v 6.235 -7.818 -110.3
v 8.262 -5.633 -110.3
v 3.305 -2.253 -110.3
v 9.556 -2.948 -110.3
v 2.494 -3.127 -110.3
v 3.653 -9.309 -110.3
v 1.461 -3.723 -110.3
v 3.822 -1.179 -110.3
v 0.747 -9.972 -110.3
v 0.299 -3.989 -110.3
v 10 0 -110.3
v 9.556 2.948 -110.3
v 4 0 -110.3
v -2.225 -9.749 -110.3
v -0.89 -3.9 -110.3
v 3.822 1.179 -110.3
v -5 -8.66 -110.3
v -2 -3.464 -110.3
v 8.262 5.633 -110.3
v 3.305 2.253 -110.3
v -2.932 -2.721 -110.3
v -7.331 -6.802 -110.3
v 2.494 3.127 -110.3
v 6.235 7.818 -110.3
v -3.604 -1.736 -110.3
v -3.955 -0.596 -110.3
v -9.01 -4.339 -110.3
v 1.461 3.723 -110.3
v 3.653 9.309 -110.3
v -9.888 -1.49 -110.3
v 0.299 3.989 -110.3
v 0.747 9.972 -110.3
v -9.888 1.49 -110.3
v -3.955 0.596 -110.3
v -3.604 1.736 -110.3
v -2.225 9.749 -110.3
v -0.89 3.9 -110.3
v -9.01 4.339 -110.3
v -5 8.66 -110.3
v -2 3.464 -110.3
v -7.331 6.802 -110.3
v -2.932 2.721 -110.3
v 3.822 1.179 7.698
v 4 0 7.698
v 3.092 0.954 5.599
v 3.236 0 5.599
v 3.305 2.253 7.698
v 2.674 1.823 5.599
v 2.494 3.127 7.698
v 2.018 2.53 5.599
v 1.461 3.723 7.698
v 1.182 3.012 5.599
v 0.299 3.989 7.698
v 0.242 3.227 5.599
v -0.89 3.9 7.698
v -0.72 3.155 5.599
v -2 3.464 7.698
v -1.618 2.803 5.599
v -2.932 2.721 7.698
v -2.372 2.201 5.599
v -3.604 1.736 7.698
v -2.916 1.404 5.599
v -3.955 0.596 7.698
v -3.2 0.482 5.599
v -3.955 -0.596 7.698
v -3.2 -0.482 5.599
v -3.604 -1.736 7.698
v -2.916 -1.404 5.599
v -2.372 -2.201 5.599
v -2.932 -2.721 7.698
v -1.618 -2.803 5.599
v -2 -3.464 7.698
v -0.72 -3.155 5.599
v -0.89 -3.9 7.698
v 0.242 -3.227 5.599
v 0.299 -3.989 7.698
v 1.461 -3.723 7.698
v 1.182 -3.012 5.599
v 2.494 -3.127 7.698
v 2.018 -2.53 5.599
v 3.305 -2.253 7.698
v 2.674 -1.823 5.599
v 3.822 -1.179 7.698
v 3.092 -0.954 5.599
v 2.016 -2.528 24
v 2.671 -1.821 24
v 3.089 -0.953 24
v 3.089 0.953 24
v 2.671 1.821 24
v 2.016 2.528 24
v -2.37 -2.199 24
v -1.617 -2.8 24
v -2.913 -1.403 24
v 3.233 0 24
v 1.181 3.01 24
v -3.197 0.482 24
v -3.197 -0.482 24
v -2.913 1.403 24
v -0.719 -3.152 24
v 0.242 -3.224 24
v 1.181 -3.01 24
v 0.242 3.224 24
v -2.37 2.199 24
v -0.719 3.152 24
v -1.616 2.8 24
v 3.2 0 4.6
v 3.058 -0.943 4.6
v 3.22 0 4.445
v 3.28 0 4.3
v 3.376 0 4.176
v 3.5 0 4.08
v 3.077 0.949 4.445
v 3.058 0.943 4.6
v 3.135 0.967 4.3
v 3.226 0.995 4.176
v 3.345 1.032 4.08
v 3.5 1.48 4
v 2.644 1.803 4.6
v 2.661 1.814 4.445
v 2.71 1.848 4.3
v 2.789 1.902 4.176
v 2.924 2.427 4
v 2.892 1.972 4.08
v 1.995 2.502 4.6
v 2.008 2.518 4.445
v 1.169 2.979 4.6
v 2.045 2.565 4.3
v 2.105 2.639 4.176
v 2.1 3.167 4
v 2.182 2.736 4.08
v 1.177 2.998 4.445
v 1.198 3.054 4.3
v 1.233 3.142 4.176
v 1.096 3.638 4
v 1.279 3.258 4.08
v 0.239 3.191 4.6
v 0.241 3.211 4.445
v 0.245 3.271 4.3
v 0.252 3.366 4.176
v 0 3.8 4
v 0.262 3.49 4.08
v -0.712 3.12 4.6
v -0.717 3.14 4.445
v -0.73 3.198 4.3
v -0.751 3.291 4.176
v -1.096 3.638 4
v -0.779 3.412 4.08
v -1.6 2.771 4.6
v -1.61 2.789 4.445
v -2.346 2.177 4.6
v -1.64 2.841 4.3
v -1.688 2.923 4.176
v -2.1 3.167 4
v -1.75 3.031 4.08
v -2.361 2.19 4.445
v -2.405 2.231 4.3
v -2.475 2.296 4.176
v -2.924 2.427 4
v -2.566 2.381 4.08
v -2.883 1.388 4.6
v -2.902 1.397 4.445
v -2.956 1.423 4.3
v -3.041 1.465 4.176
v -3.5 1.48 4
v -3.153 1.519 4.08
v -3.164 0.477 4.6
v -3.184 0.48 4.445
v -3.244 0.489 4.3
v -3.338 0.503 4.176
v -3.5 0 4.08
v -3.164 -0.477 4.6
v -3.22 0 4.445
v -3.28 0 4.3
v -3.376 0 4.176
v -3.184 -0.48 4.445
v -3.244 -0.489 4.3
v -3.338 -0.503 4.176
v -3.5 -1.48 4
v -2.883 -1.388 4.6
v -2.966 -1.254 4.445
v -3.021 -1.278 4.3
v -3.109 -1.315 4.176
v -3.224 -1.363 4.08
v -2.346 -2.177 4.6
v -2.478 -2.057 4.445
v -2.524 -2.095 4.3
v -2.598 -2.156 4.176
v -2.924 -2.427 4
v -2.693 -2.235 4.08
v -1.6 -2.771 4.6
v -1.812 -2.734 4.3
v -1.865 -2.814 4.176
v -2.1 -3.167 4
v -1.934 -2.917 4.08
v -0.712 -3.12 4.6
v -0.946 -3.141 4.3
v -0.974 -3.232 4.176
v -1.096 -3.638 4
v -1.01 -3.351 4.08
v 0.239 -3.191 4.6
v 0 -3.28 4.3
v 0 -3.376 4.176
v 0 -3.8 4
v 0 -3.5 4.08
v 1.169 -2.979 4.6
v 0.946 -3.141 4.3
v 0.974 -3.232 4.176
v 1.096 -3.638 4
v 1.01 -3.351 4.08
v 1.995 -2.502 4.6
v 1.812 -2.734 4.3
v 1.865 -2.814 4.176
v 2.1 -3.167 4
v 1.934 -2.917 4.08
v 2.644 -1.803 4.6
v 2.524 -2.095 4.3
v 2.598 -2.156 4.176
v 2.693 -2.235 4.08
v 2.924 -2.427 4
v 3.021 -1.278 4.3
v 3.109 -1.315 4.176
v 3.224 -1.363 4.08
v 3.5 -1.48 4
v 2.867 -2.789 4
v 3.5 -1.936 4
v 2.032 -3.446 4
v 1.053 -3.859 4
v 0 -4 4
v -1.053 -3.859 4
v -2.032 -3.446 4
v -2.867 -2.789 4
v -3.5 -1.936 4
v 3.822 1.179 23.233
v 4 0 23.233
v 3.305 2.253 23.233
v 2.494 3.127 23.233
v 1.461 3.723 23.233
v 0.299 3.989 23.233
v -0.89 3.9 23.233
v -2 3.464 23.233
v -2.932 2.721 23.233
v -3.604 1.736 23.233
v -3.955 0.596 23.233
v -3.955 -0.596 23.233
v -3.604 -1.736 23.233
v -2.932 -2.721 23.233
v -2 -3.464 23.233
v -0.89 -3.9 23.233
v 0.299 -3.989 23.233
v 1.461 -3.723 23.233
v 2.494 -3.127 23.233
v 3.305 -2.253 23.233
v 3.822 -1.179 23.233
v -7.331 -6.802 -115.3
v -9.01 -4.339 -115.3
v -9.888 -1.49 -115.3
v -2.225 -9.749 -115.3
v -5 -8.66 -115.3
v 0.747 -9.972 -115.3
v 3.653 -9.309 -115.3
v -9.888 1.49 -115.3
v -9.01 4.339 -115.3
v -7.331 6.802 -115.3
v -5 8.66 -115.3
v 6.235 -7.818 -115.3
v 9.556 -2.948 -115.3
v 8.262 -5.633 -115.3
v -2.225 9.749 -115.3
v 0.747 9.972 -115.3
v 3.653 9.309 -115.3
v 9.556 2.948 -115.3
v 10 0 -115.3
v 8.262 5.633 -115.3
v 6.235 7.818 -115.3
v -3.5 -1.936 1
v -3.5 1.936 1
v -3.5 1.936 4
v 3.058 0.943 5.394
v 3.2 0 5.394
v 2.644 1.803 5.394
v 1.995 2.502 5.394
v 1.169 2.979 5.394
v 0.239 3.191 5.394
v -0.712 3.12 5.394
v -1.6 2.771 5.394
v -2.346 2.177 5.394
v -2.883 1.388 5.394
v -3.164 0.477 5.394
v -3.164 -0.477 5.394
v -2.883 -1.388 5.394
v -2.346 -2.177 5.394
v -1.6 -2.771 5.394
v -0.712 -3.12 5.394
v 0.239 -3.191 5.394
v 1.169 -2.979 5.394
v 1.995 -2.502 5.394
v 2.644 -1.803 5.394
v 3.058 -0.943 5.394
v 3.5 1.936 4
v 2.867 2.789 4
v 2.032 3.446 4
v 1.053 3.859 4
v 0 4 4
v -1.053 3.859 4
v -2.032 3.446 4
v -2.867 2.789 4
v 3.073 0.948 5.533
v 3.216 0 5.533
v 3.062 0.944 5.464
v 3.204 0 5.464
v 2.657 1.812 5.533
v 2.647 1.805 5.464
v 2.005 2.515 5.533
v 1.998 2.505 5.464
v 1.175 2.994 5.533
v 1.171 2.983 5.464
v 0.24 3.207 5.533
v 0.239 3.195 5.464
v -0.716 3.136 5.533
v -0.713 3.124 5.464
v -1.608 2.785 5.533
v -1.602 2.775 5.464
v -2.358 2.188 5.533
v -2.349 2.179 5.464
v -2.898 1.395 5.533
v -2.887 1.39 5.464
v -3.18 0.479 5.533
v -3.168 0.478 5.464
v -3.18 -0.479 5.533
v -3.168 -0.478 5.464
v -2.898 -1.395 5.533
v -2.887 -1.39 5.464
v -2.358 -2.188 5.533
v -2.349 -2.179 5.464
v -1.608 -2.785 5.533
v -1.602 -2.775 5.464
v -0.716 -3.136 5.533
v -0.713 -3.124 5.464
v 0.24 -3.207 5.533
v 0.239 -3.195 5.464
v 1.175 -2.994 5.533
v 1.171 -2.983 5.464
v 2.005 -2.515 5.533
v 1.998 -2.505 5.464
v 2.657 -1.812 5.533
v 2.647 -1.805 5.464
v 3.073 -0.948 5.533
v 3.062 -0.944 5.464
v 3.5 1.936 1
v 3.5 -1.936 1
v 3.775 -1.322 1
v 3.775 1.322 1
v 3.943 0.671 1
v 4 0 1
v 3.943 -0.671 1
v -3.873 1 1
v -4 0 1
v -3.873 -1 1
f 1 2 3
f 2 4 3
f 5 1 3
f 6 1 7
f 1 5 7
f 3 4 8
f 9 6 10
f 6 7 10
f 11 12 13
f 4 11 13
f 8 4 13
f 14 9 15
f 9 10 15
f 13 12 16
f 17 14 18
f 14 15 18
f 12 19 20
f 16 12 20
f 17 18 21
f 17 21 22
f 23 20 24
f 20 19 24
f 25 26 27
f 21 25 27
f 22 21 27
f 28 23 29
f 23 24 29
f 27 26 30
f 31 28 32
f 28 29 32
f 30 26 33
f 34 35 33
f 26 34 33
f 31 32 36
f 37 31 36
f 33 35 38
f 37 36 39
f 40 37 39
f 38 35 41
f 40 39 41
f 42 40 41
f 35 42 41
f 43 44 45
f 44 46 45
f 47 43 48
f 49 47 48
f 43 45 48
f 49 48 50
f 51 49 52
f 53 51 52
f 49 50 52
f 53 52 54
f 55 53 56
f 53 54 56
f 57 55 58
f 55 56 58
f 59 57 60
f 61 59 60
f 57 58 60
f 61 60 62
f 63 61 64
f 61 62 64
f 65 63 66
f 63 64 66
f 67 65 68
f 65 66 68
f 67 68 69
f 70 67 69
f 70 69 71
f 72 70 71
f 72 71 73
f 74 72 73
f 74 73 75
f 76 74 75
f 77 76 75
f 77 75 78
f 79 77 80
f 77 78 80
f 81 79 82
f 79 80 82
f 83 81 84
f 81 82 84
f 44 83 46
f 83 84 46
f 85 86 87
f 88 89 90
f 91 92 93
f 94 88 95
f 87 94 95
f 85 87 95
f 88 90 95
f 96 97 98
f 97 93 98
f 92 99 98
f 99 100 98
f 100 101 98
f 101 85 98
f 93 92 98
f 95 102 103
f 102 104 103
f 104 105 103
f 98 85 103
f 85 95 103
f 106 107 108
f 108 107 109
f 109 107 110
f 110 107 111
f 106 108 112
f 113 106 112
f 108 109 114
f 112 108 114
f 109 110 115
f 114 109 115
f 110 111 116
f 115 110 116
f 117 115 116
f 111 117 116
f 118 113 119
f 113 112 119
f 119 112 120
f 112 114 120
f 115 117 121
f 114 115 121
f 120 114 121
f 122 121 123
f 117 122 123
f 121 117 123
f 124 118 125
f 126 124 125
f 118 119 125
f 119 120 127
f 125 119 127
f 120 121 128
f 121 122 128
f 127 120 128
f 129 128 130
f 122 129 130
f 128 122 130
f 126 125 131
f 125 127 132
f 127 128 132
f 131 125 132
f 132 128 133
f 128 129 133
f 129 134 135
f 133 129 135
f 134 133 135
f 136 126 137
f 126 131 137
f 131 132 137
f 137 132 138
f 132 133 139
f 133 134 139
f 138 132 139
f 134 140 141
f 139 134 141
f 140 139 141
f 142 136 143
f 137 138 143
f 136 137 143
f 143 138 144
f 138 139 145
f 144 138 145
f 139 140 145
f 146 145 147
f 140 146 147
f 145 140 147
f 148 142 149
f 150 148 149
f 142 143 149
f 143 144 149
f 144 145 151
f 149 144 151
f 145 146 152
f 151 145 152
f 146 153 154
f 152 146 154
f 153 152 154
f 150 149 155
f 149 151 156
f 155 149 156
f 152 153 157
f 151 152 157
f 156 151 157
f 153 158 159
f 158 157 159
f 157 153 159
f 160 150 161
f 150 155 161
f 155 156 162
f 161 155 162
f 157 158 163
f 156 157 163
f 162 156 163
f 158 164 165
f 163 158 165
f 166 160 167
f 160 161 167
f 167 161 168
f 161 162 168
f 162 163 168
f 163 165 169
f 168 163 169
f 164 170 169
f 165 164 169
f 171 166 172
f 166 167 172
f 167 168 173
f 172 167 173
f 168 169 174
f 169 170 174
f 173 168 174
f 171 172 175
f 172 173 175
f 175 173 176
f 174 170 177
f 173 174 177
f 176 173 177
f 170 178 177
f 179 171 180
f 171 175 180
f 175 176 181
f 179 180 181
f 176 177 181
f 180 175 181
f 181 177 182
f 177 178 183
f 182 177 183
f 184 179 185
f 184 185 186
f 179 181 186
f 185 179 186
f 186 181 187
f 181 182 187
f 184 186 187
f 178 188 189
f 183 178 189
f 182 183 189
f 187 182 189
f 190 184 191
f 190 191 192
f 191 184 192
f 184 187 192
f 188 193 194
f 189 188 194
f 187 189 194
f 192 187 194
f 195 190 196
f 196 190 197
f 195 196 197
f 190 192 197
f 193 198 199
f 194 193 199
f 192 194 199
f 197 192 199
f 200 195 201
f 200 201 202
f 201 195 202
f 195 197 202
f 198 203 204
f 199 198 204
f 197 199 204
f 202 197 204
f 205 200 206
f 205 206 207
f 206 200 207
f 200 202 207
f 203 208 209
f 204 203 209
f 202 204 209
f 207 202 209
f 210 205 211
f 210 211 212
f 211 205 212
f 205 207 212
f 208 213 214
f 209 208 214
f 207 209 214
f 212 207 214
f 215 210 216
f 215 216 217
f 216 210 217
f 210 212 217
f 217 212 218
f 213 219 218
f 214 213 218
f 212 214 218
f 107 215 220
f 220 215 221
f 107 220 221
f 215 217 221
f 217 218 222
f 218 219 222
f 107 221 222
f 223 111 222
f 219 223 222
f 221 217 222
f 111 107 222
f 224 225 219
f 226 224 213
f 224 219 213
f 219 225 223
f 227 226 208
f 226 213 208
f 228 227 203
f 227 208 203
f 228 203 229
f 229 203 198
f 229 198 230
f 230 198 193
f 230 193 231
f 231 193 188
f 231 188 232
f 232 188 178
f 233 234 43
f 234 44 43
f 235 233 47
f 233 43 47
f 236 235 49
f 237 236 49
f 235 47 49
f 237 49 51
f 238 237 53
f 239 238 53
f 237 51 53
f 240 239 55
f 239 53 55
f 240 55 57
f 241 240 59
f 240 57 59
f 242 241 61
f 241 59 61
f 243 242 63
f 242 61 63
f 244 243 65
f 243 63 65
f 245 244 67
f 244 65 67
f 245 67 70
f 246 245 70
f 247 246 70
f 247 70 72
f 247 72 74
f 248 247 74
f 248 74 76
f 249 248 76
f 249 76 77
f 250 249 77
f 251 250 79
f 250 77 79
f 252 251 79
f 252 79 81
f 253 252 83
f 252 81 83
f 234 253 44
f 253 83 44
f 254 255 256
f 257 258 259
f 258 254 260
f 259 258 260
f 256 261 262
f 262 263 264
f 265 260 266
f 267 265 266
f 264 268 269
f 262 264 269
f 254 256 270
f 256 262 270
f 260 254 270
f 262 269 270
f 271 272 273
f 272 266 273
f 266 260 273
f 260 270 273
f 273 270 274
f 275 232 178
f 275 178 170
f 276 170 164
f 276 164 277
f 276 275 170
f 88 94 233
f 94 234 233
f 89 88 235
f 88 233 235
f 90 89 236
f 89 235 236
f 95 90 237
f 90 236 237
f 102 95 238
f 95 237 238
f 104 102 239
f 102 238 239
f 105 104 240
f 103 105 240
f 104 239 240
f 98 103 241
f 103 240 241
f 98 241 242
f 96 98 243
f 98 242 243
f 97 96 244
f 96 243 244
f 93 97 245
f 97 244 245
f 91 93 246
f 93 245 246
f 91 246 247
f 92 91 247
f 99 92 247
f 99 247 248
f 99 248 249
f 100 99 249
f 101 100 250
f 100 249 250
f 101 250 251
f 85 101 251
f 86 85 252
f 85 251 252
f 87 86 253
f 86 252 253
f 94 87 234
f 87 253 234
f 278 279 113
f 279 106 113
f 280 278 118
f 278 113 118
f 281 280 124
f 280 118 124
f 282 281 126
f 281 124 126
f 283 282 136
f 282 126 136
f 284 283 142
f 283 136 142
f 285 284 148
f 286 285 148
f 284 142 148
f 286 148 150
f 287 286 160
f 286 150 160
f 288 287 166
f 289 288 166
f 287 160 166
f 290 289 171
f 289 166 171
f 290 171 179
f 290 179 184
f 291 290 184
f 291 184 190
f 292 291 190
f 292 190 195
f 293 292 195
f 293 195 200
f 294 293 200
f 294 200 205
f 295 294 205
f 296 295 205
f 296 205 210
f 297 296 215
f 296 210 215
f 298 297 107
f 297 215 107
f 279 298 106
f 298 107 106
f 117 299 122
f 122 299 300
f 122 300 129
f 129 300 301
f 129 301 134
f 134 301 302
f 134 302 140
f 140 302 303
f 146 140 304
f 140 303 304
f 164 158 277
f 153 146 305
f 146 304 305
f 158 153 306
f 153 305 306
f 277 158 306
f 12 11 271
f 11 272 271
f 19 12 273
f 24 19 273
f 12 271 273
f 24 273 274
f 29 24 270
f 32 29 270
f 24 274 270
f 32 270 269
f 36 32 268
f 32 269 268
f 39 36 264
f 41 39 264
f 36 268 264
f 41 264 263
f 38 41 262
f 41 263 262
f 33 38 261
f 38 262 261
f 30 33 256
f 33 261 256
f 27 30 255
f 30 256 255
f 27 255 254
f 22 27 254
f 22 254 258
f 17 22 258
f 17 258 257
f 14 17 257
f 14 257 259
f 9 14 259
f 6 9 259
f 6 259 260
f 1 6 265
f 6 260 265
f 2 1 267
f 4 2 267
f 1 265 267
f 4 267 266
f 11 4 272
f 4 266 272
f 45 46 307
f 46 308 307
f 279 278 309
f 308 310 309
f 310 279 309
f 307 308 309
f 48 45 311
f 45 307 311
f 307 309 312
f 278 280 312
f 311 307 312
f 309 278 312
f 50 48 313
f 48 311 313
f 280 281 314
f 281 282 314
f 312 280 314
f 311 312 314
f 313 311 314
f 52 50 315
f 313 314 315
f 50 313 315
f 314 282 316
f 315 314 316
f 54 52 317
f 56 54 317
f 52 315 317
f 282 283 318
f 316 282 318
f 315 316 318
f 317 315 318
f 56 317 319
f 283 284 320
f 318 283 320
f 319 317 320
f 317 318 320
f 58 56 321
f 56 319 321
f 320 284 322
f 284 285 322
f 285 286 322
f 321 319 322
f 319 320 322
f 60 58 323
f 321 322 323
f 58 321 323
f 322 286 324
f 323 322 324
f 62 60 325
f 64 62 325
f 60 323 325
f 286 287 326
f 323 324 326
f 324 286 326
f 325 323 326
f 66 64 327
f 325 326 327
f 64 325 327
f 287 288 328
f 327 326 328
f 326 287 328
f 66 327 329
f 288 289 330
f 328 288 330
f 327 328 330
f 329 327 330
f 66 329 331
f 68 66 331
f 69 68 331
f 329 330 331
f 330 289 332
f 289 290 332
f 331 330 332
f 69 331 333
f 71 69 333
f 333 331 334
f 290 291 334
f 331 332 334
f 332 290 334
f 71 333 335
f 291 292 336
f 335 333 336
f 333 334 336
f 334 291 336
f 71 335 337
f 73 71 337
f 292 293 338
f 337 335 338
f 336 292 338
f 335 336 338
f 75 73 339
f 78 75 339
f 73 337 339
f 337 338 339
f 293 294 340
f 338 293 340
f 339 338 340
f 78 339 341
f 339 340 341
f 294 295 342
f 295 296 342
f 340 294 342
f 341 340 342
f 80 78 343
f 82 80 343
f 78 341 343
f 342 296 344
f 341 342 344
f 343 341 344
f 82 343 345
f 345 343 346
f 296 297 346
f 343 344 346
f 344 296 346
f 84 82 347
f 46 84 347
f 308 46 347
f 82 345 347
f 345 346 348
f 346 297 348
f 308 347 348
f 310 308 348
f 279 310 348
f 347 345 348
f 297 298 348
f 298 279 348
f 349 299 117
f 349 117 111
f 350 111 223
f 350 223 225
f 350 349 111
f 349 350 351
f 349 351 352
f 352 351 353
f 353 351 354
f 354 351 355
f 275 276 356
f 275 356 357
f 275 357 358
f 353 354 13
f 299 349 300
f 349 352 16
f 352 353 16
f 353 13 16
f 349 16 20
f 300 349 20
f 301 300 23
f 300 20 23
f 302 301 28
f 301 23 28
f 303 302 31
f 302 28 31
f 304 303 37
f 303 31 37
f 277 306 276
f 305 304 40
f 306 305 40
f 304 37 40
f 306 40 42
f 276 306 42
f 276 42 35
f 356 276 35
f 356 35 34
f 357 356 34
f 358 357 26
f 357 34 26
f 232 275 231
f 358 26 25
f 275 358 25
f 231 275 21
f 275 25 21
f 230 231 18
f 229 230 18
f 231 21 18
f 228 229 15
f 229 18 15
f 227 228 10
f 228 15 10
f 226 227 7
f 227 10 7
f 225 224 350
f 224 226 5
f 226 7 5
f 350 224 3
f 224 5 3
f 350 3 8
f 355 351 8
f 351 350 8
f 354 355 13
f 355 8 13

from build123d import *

# Parameters (mm, degrees)
CUT_EXTRUDE1_DEPTH = 4


with BuildPart() as part:
    # Sketch1 → Revolve1 (revolve)
    with BuildSketch(Plane(origin=(0, 0, 0), x_dir=(0, 0, -1), z_dir=(1, 0, 0))):
        Polygon((-4, 0), (-4, 4), (110.3, 4), (110.3, 10), (115.3, 10), (115.3, 0), align=None)
    revolve(axis=Axis((0, 0, -115.3), (0, 0, 1)))

    # Sketch2 → Revolve2 (revolve)
    with BuildSketch(Plane(origin=(0, 0, 0), x_dir=(0, 0, -1), z_dir=(1, 0, 0))):
        with BuildLine():
            Line((-24, 0), (-24, 3.233))
            Line((-24, 3.233), (-23.233, 4))
            Line((-23.233, 4), (-7.697981936, 4))
            Line((-7.697981936, 4), (-5.599415898, 3.236184428))
            ThreePointArc((-5.599415898, 3.236184428), (-5.498392718, 3.209115348), (-5.394203812, 3.2))
            Line((-5.394203812, 3.2), (-4.6, 3.2))
            ThreePointArc((-4.6, 3.2), (-4.175735931, 3.375735931), (-4, 3.8))
            Line((-4, 3.8), (-4, 4))
            Line((-4, 4), (-3, 4))
            Line((-3, 4), (-3, 0))
            Line((-3, 0), (-24, 0))
        make_face()
    revolve(axis=Axis((0, 0, 3), (0, 0, 1)))

    # Sketch3 → Cut-Extrude1 (cut)
    with BuildSketch(Plane.XY.offset(1)):
        Polygon((-7, 14), (-7, -7), (-3.5, -7), (-3.5, 7), (3.5, 7), (3.5, -7), (7, -7), (7, 14), align=None)
    extrude(amount=CUT_EXTRUDE1_DEPTH, mode=Mode.SUBTRACT)


solid = part.part
